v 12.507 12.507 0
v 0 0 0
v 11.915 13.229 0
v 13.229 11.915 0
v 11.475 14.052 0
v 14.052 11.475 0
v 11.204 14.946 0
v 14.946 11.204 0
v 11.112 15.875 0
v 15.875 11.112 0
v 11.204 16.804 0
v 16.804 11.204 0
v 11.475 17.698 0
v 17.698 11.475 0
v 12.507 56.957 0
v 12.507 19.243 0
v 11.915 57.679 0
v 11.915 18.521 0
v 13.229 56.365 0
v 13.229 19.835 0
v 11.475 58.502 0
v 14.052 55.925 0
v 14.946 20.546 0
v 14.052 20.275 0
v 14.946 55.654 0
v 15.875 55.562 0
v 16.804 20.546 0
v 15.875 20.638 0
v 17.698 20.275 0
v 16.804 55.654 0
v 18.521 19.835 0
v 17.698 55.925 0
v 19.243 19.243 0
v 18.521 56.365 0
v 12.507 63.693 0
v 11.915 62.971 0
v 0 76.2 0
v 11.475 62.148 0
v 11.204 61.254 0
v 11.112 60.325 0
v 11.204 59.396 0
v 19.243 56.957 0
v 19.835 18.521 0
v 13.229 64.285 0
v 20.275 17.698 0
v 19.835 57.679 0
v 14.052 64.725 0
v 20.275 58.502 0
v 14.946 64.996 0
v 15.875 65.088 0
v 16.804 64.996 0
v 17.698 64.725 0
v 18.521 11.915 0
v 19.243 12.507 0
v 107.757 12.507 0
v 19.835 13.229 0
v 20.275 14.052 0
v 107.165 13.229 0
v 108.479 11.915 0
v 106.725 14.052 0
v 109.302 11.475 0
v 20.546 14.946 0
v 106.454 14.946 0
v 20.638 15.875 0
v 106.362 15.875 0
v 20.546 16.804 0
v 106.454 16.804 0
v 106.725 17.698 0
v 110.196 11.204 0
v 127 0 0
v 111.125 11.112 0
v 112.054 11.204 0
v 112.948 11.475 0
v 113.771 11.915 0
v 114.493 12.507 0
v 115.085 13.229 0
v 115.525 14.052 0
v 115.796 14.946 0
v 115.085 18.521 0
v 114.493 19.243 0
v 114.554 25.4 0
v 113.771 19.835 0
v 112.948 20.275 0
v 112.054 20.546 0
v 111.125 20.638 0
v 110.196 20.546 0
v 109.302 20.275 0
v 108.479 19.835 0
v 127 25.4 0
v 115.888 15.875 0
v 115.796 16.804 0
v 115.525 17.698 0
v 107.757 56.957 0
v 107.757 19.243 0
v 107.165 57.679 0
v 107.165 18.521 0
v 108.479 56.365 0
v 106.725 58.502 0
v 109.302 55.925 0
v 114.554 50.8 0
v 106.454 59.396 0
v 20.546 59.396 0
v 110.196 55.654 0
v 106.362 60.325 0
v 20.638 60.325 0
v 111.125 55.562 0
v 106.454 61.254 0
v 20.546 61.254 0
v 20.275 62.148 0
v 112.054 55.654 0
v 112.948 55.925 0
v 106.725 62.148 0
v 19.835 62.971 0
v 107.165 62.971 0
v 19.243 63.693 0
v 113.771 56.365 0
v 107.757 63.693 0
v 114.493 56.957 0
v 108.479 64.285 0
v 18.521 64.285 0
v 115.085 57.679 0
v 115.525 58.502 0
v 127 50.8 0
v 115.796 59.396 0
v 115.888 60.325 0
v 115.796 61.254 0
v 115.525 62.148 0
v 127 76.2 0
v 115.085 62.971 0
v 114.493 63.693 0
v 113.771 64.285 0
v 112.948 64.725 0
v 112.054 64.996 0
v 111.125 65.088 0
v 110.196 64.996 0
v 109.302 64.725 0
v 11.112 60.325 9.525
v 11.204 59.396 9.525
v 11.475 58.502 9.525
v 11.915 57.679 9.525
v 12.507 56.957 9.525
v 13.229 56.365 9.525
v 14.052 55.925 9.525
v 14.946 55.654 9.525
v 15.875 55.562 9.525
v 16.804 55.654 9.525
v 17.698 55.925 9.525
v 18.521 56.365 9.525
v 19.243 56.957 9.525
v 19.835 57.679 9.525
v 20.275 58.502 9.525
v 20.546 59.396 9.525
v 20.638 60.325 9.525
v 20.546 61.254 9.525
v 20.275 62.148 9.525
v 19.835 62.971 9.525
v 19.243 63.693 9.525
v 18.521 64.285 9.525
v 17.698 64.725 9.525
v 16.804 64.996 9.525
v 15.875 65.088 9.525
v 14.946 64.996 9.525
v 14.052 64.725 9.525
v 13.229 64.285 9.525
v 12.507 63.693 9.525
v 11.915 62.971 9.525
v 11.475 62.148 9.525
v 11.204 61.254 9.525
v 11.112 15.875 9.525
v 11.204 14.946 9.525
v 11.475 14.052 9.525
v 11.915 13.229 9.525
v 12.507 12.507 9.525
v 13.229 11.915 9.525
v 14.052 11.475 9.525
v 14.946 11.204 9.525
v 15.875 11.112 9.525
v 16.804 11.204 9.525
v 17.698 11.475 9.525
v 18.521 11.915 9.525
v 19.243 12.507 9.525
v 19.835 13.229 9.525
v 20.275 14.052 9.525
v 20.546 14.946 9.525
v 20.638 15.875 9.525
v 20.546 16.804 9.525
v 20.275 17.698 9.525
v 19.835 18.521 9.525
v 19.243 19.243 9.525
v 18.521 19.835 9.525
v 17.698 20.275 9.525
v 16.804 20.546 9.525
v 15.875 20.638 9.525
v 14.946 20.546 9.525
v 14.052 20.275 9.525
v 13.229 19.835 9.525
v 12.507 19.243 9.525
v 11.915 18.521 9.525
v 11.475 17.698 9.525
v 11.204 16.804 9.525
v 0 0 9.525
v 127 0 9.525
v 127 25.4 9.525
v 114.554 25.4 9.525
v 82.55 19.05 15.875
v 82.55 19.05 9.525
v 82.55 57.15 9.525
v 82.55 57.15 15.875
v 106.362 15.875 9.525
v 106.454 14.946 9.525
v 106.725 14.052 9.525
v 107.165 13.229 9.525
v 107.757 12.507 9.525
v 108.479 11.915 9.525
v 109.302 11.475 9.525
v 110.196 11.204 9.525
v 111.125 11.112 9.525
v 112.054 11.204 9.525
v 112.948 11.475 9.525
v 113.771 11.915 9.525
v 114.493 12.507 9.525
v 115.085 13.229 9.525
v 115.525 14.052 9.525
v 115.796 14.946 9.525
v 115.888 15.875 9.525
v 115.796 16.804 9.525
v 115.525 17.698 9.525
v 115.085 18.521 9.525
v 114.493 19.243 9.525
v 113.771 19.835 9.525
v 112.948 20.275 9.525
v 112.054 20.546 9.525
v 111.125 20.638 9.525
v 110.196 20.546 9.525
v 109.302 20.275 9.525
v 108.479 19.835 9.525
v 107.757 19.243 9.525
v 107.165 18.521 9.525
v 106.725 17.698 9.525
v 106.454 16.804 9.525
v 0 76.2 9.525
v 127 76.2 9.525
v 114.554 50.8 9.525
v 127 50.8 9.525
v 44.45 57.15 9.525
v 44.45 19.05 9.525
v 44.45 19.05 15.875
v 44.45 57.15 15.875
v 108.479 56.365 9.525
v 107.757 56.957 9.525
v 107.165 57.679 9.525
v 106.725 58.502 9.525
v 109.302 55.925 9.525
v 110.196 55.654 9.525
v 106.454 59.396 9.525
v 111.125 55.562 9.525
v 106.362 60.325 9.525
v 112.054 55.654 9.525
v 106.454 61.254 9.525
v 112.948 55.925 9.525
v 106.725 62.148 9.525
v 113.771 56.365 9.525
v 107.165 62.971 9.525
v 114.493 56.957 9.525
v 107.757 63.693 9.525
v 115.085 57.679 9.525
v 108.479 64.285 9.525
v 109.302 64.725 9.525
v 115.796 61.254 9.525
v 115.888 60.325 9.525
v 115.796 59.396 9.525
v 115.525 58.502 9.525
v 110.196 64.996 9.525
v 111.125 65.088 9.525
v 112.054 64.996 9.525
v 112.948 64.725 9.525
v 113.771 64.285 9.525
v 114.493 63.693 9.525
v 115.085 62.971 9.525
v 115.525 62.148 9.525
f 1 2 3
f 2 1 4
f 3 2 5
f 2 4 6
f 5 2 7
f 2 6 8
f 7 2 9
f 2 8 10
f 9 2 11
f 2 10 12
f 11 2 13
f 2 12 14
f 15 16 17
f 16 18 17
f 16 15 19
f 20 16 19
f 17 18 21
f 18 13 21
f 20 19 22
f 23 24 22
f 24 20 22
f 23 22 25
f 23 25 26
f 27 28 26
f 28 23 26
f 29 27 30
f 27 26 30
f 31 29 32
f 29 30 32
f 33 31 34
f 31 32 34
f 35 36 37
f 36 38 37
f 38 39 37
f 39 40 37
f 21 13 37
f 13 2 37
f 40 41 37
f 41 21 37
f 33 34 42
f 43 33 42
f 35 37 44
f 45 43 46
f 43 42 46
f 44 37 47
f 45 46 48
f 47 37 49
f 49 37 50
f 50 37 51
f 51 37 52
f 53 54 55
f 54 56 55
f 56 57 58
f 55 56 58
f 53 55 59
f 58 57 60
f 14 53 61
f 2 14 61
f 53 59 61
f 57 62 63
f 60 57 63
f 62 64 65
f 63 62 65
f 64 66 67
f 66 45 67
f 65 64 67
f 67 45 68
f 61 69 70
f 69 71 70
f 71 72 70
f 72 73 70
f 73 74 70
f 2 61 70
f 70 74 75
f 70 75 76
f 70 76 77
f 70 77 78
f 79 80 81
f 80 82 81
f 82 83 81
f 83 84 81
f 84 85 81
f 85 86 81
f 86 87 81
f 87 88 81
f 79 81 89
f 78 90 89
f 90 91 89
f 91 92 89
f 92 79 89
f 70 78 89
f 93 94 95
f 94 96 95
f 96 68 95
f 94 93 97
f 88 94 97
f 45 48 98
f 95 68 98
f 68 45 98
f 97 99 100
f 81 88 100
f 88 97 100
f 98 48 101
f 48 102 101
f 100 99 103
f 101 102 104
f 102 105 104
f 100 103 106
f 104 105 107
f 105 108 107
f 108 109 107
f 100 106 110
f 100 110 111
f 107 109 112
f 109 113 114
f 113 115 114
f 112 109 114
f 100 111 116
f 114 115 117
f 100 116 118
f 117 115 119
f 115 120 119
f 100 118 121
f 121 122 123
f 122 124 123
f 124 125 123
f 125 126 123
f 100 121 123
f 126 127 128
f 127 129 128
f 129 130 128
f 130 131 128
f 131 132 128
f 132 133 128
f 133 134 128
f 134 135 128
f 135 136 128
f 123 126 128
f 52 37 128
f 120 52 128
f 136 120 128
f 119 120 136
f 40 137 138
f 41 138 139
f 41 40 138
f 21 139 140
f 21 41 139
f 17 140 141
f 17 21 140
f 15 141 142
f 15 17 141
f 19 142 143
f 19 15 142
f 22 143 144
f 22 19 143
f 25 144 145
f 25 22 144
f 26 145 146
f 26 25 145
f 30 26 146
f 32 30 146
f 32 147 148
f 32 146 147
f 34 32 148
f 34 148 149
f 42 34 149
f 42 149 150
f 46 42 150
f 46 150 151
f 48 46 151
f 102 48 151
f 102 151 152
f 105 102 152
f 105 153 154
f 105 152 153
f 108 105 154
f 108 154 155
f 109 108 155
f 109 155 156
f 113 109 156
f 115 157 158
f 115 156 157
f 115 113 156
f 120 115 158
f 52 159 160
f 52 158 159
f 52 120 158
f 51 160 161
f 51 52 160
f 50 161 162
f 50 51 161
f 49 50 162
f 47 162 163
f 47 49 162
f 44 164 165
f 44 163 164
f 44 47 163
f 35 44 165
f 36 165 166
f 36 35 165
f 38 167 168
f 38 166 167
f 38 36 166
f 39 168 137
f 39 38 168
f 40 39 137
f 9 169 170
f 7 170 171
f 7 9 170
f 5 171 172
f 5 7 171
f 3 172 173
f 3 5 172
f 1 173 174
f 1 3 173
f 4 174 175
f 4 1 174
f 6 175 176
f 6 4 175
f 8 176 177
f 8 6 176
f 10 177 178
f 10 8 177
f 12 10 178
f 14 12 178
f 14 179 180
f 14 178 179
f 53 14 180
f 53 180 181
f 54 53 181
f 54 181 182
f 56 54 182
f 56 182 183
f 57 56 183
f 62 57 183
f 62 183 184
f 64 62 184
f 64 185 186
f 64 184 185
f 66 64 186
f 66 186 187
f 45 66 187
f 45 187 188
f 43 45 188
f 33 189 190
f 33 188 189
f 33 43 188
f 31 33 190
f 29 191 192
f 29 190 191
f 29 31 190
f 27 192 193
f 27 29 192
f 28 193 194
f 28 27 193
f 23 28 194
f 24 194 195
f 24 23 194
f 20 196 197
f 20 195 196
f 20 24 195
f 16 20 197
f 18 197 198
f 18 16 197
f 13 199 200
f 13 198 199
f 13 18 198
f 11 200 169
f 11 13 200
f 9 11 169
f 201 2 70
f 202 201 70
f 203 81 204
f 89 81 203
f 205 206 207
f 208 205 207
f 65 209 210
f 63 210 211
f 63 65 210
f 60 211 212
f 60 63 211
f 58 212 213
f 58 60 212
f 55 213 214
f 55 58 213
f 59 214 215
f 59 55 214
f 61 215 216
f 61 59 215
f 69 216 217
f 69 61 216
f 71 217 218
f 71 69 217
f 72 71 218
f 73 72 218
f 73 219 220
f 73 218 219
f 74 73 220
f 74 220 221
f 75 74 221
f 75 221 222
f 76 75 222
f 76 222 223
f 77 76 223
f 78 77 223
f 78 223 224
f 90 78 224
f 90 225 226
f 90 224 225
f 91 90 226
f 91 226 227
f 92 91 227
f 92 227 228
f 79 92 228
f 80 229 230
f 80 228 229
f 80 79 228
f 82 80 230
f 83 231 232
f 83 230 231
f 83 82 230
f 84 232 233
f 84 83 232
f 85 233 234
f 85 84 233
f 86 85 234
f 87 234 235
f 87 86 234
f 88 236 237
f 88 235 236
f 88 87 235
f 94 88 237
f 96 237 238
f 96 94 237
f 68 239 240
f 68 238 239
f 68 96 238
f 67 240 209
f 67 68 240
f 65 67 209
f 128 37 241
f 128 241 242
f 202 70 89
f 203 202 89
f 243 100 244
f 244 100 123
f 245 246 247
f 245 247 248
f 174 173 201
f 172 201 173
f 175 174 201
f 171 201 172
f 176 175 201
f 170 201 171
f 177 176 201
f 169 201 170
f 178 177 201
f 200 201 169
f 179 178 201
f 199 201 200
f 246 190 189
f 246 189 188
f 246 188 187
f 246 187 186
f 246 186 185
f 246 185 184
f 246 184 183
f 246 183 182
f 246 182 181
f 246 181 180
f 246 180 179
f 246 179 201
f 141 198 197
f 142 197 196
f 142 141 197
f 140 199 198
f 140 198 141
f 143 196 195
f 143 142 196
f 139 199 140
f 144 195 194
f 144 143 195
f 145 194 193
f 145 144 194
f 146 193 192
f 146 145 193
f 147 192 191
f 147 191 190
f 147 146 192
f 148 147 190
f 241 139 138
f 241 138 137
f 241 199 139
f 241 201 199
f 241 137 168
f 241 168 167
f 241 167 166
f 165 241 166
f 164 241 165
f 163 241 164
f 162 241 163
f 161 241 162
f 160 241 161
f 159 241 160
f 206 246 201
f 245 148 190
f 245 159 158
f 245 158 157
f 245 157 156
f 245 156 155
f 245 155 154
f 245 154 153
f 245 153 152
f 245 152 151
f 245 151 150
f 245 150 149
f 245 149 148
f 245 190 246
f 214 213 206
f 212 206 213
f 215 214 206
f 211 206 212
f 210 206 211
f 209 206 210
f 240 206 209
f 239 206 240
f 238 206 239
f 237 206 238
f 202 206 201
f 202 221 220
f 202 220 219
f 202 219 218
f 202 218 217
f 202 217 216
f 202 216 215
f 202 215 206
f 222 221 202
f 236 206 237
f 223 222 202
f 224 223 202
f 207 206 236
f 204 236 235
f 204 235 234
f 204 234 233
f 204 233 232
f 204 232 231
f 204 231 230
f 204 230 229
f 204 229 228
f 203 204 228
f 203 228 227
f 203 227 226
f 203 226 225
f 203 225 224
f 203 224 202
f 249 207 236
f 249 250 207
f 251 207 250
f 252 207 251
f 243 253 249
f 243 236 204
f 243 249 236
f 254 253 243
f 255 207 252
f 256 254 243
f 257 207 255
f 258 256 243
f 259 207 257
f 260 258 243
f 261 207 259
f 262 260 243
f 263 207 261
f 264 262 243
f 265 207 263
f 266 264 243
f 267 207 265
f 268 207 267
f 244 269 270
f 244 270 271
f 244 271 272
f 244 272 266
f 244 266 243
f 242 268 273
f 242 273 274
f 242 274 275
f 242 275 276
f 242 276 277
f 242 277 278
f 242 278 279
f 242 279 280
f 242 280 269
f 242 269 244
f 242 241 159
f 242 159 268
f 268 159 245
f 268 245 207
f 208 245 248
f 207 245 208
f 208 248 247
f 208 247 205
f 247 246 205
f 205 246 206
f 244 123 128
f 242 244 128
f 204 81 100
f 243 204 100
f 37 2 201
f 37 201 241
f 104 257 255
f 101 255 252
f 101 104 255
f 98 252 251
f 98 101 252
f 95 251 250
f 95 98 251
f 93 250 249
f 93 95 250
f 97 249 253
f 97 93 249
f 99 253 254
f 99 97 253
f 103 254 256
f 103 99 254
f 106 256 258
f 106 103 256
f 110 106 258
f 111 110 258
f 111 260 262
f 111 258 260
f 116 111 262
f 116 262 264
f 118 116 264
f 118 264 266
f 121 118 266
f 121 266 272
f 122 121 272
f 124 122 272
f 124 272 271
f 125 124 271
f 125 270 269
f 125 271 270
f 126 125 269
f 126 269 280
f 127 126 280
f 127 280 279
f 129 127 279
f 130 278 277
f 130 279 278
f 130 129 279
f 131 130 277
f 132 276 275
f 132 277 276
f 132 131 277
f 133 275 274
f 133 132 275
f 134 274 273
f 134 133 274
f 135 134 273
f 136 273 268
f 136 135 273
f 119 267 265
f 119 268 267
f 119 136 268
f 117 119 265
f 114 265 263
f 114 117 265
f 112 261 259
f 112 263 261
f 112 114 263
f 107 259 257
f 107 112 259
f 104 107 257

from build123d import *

# Parameters (mm, degrees)
SKETCH1_W         = 127
SKETCH1_H         = 76.2
BASE_PLATE_DEPTH  = 9.525
SKETCH2_W         = 38.1
SKETCH2_H         = 38.1
RAISED_BOSS_DEPTH = 6.35
SKETCH3_W         = 12.7
SKETCH3_H         = 25.4
EDGE_NOTCH_DEPTH  = 149.954542143
SKETCH4_R         = 4.7625
HOLE_1_DEPTH      = 149.954542143
SKETCH5_R         = 4.7625
HOLE_2_DEPTH      = 149.954542143
SKETCH6_R         = 4.7625
HOLE_3_DEPTH      = 149.954542143
SKETCH7_R         = 4.7625
HOLE_4_DEPTH      = 149.954542143


with BuildPart() as part:
    # Sketch1 → base_plate (new body)
    with BuildSketch(Plane.XY):
        with Locations((63.5, 38.1)):
            Rectangle(SKETCH1_W, SKETCH1_H)
    extrude(amount=BASE_PLATE_DEPTH)

    # Sketch2 → raised_boss (add)
    with BuildSketch(Plane.XY.offset(9.525)):
        with Locations((63.5, 38.1)):
            Rectangle(SKETCH2_W, SKETCH2_H)
    extrude(amount=RAISED_BOSS_DEPTH)

    # Sketch3 → edge_notch (cut, through all)
    with BuildSketch(Plane.XY):
        with Locations((120.904, 38.1)):
            Rectangle(SKETCH3_W, SKETCH3_H)
    extrude(amount=EDGE_NOTCH_DEPTH, mode=Mode.SUBTRACT)

    # Sketch4 → hole_1 (cut, through all)
    with BuildSketch(Plane.XY):
        with Locations(Location((15.875, 15.875, 0), (0, 0, 180))):
            Circle(SKETCH4_R)
    extrude(amount=HOLE_1_DEPTH, mode=Mode.SUBTRACT)

    # Sketch5 → hole_2 (cut, through all)
    with BuildSketch(Plane.XY):
        with Locations(Location((111.125, 15.875, 0), (0, 0, 180))):
            Circle(SKETCH5_R)
    extrude(amount=HOLE_2_DEPTH, mode=Mode.SUBTRACT)

    # Sketch6 → hole_3 (cut, through all)
    with BuildSketch(Plane.XY):
        with Locations(Location((15.875, 60.325, 0), (0, 0, 180))):
            Circle(SKETCH6_R)
    extrude(amount=HOLE_3_DEPTH, mode=Mode.SUBTRACT)

    # Sketch7 → hole_4 (cut, through all)
    with BuildSketch(Plane.XY):
        with Locations(Location((111.125, 60.325, 0), (0, 0, 180))):
            Circle(SKETCH7_R)
    extrude(amount=HOLE_4_DEPTH, mode=Mode.SUBTRACT)


solid = part.part
